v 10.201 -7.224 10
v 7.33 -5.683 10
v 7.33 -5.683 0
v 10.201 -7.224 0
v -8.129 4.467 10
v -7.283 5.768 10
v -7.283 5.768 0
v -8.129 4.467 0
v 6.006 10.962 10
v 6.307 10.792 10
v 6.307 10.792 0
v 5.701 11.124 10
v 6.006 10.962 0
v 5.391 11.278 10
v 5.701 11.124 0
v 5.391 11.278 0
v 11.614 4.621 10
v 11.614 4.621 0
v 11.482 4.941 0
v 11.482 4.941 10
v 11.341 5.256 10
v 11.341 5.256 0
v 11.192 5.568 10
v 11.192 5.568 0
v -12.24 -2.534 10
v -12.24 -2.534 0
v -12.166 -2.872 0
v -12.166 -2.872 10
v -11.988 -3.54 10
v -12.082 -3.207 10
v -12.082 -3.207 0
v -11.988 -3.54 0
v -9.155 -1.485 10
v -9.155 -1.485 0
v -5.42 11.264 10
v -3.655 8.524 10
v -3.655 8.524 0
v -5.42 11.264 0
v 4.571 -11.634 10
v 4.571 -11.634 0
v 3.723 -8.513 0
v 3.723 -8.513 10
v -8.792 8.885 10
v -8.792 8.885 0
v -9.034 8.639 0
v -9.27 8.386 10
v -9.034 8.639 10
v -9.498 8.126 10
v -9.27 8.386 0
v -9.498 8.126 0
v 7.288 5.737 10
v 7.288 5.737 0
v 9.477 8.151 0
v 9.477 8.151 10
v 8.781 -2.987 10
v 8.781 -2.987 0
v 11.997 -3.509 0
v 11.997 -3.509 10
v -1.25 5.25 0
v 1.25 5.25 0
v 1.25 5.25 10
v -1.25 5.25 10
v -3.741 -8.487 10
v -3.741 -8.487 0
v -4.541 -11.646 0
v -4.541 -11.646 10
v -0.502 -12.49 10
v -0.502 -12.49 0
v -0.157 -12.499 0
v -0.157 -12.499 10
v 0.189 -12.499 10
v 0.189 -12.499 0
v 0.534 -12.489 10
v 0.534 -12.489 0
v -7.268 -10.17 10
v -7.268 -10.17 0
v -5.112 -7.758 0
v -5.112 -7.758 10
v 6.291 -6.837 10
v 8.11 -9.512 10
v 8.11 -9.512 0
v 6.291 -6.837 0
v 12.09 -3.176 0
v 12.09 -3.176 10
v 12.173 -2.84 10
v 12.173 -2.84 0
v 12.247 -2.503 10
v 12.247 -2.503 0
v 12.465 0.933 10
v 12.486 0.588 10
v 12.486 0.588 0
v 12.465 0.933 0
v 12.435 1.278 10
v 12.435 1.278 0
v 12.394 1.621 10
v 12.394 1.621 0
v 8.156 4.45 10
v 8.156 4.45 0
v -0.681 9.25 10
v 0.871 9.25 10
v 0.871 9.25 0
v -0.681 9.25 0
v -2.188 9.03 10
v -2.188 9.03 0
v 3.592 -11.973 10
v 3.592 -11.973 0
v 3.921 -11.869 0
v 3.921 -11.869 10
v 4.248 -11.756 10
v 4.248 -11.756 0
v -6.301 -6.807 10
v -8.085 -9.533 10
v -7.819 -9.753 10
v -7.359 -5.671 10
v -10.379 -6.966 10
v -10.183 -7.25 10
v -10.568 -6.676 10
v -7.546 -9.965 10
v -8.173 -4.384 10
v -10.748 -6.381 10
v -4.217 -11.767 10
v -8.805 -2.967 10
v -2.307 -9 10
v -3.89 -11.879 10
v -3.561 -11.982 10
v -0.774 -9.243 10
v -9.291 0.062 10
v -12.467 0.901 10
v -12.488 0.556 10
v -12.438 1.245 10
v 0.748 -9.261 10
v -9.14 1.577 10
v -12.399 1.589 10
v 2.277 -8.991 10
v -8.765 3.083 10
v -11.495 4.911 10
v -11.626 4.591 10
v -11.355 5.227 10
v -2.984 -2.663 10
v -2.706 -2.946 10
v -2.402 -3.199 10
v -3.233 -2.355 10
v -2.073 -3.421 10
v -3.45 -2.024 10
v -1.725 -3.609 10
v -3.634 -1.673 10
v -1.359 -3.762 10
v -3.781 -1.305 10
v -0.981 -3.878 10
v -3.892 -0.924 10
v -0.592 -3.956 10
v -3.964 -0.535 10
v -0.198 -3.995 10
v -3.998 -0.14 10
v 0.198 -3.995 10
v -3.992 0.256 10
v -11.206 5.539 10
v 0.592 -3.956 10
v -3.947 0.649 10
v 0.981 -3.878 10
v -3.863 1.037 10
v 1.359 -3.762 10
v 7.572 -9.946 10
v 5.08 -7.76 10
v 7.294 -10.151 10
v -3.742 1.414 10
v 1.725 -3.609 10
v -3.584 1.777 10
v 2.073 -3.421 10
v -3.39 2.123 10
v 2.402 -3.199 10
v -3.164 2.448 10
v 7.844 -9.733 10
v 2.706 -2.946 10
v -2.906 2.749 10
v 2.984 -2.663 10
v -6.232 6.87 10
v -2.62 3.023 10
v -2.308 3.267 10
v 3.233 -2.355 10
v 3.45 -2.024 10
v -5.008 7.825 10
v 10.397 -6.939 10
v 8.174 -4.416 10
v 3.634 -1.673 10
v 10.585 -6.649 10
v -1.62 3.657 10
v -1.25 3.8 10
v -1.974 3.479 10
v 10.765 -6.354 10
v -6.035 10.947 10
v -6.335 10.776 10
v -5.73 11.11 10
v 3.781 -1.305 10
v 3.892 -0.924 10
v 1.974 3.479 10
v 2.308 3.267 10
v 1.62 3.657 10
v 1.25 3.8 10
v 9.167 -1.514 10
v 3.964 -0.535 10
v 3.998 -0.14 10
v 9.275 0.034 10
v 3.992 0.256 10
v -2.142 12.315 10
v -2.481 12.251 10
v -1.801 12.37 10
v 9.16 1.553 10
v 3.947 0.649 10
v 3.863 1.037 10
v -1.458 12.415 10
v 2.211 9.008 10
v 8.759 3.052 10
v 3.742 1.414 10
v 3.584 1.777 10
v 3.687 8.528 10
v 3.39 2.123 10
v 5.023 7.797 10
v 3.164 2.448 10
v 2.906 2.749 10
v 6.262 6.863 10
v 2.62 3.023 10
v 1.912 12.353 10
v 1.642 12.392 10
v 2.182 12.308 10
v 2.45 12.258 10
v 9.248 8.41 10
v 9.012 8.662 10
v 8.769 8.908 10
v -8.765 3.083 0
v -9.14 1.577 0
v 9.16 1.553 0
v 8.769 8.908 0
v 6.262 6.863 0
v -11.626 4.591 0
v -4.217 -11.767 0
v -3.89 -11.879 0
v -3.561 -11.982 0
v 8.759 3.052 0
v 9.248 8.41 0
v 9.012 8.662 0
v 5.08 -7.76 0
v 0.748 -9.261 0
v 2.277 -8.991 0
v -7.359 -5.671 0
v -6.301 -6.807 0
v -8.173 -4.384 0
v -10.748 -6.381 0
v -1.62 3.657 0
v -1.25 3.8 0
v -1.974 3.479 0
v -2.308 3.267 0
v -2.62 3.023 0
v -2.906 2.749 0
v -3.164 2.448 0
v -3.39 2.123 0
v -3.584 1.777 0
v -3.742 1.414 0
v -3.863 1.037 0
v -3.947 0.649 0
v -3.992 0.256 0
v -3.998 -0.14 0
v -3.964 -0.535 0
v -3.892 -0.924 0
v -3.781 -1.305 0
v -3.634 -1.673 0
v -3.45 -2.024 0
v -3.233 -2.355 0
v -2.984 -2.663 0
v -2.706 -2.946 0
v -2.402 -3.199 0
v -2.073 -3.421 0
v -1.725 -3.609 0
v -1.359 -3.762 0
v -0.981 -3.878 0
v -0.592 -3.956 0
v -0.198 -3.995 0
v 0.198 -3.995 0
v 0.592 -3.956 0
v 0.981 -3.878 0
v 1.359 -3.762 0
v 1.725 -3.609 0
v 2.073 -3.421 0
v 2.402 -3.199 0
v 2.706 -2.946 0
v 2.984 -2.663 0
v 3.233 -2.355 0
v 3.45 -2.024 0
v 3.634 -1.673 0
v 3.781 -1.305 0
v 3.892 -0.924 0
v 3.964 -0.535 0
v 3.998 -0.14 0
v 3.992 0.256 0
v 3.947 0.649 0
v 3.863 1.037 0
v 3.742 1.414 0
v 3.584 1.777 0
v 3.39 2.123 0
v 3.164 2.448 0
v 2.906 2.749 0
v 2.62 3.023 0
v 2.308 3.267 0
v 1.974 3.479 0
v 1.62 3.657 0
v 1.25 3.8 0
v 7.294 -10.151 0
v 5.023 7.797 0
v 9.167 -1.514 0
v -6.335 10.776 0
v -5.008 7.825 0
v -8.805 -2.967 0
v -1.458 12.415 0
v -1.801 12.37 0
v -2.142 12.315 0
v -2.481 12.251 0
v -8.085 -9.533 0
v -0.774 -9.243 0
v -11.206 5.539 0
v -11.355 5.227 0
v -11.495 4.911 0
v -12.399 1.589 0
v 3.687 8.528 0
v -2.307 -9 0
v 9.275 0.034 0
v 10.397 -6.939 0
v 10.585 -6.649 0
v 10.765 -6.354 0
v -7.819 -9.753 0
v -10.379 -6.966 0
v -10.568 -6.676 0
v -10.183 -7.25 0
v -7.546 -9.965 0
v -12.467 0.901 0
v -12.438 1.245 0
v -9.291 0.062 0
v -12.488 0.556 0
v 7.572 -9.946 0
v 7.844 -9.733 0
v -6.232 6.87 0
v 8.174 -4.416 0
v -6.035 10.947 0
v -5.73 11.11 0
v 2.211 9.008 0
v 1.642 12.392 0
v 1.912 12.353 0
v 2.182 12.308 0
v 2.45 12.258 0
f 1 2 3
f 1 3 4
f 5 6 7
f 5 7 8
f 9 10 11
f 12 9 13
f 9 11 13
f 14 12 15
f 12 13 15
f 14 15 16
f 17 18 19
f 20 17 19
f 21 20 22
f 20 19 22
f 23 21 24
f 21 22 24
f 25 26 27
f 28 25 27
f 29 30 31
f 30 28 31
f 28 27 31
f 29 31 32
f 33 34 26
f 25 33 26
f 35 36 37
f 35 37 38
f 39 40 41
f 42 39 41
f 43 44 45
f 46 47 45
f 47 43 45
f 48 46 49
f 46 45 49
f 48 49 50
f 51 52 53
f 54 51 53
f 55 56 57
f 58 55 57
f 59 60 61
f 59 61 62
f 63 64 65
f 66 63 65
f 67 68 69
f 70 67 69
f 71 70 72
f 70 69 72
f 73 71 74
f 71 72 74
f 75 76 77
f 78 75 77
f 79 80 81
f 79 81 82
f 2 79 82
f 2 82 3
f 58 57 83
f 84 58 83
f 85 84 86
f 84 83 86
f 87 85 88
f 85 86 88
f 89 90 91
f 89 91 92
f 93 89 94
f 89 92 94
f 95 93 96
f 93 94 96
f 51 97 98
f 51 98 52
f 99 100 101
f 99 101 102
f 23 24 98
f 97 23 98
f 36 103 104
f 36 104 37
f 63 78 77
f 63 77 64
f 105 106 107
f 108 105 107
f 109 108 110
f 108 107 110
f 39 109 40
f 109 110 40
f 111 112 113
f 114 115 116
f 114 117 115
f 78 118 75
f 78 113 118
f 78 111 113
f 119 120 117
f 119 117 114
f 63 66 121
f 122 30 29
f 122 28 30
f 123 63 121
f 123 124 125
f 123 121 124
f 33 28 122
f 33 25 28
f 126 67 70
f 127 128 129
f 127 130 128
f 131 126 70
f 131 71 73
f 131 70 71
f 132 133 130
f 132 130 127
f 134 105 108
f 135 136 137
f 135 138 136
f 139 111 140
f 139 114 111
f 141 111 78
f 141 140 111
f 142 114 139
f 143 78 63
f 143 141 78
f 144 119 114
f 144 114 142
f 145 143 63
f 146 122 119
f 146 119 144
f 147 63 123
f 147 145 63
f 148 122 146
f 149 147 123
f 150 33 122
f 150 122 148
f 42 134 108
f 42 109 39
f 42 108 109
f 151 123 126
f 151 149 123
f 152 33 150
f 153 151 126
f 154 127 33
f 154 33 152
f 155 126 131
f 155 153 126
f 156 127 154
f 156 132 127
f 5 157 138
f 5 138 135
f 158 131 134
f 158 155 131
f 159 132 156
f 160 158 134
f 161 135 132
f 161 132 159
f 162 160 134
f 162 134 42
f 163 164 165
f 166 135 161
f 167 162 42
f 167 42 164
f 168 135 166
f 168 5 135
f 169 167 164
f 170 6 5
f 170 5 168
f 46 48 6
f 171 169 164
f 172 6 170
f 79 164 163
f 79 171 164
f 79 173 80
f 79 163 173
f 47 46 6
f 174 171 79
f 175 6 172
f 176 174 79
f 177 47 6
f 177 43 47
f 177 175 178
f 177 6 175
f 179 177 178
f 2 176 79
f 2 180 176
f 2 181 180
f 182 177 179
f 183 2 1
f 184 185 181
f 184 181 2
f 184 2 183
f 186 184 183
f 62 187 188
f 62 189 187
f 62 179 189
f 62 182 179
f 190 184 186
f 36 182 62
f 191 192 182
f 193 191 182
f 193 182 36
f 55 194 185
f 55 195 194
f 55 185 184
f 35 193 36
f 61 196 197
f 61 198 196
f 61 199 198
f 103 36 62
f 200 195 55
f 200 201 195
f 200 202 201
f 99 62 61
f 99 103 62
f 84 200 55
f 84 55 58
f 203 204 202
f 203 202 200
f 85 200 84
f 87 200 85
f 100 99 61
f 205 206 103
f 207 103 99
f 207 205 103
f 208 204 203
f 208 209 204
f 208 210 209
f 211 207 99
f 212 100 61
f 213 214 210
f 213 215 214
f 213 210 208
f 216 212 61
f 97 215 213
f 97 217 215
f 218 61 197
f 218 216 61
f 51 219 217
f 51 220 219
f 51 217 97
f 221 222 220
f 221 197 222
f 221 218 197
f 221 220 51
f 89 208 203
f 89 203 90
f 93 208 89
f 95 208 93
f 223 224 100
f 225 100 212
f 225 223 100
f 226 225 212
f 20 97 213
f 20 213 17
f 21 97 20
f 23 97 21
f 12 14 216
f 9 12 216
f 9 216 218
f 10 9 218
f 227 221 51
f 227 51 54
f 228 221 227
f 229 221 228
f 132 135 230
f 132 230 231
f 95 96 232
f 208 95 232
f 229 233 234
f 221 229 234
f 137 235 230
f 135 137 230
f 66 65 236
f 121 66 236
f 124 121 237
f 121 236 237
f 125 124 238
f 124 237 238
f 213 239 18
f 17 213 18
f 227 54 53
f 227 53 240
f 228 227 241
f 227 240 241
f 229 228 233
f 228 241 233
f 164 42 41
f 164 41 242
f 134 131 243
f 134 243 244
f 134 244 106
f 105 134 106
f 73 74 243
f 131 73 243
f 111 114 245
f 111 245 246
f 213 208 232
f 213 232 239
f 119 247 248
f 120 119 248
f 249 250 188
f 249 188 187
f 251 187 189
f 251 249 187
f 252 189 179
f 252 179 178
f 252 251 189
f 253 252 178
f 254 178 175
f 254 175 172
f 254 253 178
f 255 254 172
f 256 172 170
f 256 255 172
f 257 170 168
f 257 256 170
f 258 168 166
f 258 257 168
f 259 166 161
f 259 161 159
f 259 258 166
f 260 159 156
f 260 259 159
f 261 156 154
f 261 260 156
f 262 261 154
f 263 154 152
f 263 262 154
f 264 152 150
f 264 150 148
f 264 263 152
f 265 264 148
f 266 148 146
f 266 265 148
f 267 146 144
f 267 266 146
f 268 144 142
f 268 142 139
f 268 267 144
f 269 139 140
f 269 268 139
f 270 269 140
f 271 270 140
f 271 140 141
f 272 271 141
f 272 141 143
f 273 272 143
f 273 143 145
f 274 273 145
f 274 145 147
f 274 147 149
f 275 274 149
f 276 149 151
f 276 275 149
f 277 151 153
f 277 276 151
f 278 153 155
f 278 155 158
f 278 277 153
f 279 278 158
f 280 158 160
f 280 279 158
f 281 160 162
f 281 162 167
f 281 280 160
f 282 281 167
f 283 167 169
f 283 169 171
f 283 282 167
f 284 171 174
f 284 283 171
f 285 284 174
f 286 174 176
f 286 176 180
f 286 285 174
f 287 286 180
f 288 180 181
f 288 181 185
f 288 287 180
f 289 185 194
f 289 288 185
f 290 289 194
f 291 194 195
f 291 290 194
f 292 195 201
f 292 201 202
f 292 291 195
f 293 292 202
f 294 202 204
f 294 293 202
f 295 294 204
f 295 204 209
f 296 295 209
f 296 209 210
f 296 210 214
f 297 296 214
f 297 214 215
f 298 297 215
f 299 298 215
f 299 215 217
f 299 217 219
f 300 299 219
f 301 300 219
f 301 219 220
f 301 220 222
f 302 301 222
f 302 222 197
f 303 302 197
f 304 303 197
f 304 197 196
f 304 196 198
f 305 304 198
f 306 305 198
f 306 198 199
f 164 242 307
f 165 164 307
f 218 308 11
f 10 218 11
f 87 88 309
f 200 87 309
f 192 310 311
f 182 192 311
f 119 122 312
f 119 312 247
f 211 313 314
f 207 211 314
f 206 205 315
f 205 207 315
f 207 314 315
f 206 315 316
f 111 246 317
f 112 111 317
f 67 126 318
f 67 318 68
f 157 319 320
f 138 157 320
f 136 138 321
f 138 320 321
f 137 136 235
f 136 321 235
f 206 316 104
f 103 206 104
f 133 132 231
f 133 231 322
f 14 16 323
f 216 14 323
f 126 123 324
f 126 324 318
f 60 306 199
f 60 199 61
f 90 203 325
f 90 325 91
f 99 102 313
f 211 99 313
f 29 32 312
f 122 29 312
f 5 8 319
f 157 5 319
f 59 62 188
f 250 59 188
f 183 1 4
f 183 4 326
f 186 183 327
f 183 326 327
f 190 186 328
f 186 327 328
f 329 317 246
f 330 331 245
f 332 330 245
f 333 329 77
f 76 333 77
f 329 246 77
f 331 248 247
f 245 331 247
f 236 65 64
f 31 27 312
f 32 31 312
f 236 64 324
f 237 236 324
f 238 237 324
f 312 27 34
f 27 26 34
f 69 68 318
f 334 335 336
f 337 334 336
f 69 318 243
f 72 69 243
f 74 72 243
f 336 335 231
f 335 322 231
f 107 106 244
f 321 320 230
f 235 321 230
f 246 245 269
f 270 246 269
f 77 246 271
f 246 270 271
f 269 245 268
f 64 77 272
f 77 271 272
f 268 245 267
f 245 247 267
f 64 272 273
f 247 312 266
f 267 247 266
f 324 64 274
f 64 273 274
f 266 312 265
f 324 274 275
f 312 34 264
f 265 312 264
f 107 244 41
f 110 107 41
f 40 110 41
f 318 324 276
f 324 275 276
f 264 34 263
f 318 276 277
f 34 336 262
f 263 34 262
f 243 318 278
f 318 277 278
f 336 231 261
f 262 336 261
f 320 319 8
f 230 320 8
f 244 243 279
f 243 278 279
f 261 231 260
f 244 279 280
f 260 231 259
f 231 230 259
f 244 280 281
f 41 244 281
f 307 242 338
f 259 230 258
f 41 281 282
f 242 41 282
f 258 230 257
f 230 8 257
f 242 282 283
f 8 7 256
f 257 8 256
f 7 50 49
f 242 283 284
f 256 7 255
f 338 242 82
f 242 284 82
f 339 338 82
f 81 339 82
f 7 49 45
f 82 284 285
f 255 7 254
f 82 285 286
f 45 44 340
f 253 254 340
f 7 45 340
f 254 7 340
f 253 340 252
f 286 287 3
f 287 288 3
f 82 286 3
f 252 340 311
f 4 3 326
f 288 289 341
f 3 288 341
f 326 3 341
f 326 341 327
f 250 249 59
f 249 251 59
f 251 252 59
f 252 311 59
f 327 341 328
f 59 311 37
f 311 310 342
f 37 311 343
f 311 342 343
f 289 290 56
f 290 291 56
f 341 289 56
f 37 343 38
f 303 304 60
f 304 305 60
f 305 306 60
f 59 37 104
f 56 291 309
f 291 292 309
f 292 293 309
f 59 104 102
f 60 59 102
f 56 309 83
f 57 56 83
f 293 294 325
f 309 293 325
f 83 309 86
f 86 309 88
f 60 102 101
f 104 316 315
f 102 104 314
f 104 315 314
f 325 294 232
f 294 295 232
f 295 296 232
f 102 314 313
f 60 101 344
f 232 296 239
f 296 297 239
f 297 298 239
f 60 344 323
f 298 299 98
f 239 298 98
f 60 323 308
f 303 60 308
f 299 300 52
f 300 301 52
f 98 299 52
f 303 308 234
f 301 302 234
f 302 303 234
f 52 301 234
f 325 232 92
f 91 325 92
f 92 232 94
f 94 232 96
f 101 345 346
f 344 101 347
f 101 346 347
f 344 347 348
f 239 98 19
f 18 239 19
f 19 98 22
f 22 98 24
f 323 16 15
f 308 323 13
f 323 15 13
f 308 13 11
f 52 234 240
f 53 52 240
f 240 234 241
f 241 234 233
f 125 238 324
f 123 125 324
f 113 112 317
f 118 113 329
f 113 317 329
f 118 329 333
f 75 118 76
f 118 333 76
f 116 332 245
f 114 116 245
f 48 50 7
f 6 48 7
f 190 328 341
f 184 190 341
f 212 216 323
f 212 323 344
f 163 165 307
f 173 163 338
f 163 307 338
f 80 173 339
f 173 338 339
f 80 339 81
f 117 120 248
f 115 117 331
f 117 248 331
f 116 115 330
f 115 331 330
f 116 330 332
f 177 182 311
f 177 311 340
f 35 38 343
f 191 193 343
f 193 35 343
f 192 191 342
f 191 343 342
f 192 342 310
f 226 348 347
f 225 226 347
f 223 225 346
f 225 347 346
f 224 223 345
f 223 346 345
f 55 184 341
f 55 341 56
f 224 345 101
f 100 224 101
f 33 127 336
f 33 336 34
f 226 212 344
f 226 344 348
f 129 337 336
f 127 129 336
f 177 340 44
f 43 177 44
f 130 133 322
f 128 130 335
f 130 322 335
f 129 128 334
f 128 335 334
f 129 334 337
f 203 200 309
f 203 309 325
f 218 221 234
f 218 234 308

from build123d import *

# Parameters (mm, degrees)
CROQUIS1_R              = 12.5
SALIENTE_EXTRUIR1_DEPTH = 10
CORTAR_EXTRUIR1_DEPTH   = 21.310096012
MATRIZC1_COUNT          = 19
MATRIZC1_ANGLE          = 342
CORTAR_EXTRUIR2_DEPTH   = 10


with BuildPart() as part:
    # Croquis1 → Saliente-Extruir1 (new body)
    with BuildSketch(Plane.XY):
        Circle(CROQUIS1_R)
    extrude(amount=SALIENTE_EXTRUIR1_DEPTH)

    # Croquis2 → Cortar-Extruir1 (cut, through all)
    with BuildSketch(Plane(origin=(0, 0, 0), x_dir=(-1, 0, 0), z_dir=(0, 0, -1))):
        Polygon((-1.66896446, 12.5), (-0.871074147, 9.25), (0.68103554, 9.25), (1.478925853, 12.5), align=None)
    cortar_extruir1 = extrude(amount=-CORTAR_EXTRUIR1_DEPTH, mode=Mode.SUBTRACT)

    # MatrizC1: Cortar-Extruir1 ×19 about axis
    matrizc1_axis = Axis((0, 0, 0), (0, 0, 1))
    for i in range(1, MATRIZC1_COUNT):
        add(cortar_extruir1.rotate(matrizc1_axis, i * MATRIZC1_ANGLE / (MATRIZC1_COUNT - 1)), mode=Mode.SUBTRACT)

    # Croquis3 → Cortar-Extruir2 (cut)
    with BuildSketch(Plane(origin=(0, 0, 0), x_dir=(-1, 0, 0), z_dir=(0, 0, -1))):
        with BuildLine():
            Line((-1.25, 3.799671038), (-1.25, 5.25))
            Line((-1.25, 5.25), (1.25, 5.25))
            Line((1.25, 5.25), (1.25, 3.799671038))
            ThreePointArc((1.25, 3.799671038), (0, -4), (-1.25, 3.799671038))
        make_face()
    extrude(amount=-CORTAR_EXTRUIR2_DEPTH, mode=Mode.SUBTRACT)


solid = part.part
